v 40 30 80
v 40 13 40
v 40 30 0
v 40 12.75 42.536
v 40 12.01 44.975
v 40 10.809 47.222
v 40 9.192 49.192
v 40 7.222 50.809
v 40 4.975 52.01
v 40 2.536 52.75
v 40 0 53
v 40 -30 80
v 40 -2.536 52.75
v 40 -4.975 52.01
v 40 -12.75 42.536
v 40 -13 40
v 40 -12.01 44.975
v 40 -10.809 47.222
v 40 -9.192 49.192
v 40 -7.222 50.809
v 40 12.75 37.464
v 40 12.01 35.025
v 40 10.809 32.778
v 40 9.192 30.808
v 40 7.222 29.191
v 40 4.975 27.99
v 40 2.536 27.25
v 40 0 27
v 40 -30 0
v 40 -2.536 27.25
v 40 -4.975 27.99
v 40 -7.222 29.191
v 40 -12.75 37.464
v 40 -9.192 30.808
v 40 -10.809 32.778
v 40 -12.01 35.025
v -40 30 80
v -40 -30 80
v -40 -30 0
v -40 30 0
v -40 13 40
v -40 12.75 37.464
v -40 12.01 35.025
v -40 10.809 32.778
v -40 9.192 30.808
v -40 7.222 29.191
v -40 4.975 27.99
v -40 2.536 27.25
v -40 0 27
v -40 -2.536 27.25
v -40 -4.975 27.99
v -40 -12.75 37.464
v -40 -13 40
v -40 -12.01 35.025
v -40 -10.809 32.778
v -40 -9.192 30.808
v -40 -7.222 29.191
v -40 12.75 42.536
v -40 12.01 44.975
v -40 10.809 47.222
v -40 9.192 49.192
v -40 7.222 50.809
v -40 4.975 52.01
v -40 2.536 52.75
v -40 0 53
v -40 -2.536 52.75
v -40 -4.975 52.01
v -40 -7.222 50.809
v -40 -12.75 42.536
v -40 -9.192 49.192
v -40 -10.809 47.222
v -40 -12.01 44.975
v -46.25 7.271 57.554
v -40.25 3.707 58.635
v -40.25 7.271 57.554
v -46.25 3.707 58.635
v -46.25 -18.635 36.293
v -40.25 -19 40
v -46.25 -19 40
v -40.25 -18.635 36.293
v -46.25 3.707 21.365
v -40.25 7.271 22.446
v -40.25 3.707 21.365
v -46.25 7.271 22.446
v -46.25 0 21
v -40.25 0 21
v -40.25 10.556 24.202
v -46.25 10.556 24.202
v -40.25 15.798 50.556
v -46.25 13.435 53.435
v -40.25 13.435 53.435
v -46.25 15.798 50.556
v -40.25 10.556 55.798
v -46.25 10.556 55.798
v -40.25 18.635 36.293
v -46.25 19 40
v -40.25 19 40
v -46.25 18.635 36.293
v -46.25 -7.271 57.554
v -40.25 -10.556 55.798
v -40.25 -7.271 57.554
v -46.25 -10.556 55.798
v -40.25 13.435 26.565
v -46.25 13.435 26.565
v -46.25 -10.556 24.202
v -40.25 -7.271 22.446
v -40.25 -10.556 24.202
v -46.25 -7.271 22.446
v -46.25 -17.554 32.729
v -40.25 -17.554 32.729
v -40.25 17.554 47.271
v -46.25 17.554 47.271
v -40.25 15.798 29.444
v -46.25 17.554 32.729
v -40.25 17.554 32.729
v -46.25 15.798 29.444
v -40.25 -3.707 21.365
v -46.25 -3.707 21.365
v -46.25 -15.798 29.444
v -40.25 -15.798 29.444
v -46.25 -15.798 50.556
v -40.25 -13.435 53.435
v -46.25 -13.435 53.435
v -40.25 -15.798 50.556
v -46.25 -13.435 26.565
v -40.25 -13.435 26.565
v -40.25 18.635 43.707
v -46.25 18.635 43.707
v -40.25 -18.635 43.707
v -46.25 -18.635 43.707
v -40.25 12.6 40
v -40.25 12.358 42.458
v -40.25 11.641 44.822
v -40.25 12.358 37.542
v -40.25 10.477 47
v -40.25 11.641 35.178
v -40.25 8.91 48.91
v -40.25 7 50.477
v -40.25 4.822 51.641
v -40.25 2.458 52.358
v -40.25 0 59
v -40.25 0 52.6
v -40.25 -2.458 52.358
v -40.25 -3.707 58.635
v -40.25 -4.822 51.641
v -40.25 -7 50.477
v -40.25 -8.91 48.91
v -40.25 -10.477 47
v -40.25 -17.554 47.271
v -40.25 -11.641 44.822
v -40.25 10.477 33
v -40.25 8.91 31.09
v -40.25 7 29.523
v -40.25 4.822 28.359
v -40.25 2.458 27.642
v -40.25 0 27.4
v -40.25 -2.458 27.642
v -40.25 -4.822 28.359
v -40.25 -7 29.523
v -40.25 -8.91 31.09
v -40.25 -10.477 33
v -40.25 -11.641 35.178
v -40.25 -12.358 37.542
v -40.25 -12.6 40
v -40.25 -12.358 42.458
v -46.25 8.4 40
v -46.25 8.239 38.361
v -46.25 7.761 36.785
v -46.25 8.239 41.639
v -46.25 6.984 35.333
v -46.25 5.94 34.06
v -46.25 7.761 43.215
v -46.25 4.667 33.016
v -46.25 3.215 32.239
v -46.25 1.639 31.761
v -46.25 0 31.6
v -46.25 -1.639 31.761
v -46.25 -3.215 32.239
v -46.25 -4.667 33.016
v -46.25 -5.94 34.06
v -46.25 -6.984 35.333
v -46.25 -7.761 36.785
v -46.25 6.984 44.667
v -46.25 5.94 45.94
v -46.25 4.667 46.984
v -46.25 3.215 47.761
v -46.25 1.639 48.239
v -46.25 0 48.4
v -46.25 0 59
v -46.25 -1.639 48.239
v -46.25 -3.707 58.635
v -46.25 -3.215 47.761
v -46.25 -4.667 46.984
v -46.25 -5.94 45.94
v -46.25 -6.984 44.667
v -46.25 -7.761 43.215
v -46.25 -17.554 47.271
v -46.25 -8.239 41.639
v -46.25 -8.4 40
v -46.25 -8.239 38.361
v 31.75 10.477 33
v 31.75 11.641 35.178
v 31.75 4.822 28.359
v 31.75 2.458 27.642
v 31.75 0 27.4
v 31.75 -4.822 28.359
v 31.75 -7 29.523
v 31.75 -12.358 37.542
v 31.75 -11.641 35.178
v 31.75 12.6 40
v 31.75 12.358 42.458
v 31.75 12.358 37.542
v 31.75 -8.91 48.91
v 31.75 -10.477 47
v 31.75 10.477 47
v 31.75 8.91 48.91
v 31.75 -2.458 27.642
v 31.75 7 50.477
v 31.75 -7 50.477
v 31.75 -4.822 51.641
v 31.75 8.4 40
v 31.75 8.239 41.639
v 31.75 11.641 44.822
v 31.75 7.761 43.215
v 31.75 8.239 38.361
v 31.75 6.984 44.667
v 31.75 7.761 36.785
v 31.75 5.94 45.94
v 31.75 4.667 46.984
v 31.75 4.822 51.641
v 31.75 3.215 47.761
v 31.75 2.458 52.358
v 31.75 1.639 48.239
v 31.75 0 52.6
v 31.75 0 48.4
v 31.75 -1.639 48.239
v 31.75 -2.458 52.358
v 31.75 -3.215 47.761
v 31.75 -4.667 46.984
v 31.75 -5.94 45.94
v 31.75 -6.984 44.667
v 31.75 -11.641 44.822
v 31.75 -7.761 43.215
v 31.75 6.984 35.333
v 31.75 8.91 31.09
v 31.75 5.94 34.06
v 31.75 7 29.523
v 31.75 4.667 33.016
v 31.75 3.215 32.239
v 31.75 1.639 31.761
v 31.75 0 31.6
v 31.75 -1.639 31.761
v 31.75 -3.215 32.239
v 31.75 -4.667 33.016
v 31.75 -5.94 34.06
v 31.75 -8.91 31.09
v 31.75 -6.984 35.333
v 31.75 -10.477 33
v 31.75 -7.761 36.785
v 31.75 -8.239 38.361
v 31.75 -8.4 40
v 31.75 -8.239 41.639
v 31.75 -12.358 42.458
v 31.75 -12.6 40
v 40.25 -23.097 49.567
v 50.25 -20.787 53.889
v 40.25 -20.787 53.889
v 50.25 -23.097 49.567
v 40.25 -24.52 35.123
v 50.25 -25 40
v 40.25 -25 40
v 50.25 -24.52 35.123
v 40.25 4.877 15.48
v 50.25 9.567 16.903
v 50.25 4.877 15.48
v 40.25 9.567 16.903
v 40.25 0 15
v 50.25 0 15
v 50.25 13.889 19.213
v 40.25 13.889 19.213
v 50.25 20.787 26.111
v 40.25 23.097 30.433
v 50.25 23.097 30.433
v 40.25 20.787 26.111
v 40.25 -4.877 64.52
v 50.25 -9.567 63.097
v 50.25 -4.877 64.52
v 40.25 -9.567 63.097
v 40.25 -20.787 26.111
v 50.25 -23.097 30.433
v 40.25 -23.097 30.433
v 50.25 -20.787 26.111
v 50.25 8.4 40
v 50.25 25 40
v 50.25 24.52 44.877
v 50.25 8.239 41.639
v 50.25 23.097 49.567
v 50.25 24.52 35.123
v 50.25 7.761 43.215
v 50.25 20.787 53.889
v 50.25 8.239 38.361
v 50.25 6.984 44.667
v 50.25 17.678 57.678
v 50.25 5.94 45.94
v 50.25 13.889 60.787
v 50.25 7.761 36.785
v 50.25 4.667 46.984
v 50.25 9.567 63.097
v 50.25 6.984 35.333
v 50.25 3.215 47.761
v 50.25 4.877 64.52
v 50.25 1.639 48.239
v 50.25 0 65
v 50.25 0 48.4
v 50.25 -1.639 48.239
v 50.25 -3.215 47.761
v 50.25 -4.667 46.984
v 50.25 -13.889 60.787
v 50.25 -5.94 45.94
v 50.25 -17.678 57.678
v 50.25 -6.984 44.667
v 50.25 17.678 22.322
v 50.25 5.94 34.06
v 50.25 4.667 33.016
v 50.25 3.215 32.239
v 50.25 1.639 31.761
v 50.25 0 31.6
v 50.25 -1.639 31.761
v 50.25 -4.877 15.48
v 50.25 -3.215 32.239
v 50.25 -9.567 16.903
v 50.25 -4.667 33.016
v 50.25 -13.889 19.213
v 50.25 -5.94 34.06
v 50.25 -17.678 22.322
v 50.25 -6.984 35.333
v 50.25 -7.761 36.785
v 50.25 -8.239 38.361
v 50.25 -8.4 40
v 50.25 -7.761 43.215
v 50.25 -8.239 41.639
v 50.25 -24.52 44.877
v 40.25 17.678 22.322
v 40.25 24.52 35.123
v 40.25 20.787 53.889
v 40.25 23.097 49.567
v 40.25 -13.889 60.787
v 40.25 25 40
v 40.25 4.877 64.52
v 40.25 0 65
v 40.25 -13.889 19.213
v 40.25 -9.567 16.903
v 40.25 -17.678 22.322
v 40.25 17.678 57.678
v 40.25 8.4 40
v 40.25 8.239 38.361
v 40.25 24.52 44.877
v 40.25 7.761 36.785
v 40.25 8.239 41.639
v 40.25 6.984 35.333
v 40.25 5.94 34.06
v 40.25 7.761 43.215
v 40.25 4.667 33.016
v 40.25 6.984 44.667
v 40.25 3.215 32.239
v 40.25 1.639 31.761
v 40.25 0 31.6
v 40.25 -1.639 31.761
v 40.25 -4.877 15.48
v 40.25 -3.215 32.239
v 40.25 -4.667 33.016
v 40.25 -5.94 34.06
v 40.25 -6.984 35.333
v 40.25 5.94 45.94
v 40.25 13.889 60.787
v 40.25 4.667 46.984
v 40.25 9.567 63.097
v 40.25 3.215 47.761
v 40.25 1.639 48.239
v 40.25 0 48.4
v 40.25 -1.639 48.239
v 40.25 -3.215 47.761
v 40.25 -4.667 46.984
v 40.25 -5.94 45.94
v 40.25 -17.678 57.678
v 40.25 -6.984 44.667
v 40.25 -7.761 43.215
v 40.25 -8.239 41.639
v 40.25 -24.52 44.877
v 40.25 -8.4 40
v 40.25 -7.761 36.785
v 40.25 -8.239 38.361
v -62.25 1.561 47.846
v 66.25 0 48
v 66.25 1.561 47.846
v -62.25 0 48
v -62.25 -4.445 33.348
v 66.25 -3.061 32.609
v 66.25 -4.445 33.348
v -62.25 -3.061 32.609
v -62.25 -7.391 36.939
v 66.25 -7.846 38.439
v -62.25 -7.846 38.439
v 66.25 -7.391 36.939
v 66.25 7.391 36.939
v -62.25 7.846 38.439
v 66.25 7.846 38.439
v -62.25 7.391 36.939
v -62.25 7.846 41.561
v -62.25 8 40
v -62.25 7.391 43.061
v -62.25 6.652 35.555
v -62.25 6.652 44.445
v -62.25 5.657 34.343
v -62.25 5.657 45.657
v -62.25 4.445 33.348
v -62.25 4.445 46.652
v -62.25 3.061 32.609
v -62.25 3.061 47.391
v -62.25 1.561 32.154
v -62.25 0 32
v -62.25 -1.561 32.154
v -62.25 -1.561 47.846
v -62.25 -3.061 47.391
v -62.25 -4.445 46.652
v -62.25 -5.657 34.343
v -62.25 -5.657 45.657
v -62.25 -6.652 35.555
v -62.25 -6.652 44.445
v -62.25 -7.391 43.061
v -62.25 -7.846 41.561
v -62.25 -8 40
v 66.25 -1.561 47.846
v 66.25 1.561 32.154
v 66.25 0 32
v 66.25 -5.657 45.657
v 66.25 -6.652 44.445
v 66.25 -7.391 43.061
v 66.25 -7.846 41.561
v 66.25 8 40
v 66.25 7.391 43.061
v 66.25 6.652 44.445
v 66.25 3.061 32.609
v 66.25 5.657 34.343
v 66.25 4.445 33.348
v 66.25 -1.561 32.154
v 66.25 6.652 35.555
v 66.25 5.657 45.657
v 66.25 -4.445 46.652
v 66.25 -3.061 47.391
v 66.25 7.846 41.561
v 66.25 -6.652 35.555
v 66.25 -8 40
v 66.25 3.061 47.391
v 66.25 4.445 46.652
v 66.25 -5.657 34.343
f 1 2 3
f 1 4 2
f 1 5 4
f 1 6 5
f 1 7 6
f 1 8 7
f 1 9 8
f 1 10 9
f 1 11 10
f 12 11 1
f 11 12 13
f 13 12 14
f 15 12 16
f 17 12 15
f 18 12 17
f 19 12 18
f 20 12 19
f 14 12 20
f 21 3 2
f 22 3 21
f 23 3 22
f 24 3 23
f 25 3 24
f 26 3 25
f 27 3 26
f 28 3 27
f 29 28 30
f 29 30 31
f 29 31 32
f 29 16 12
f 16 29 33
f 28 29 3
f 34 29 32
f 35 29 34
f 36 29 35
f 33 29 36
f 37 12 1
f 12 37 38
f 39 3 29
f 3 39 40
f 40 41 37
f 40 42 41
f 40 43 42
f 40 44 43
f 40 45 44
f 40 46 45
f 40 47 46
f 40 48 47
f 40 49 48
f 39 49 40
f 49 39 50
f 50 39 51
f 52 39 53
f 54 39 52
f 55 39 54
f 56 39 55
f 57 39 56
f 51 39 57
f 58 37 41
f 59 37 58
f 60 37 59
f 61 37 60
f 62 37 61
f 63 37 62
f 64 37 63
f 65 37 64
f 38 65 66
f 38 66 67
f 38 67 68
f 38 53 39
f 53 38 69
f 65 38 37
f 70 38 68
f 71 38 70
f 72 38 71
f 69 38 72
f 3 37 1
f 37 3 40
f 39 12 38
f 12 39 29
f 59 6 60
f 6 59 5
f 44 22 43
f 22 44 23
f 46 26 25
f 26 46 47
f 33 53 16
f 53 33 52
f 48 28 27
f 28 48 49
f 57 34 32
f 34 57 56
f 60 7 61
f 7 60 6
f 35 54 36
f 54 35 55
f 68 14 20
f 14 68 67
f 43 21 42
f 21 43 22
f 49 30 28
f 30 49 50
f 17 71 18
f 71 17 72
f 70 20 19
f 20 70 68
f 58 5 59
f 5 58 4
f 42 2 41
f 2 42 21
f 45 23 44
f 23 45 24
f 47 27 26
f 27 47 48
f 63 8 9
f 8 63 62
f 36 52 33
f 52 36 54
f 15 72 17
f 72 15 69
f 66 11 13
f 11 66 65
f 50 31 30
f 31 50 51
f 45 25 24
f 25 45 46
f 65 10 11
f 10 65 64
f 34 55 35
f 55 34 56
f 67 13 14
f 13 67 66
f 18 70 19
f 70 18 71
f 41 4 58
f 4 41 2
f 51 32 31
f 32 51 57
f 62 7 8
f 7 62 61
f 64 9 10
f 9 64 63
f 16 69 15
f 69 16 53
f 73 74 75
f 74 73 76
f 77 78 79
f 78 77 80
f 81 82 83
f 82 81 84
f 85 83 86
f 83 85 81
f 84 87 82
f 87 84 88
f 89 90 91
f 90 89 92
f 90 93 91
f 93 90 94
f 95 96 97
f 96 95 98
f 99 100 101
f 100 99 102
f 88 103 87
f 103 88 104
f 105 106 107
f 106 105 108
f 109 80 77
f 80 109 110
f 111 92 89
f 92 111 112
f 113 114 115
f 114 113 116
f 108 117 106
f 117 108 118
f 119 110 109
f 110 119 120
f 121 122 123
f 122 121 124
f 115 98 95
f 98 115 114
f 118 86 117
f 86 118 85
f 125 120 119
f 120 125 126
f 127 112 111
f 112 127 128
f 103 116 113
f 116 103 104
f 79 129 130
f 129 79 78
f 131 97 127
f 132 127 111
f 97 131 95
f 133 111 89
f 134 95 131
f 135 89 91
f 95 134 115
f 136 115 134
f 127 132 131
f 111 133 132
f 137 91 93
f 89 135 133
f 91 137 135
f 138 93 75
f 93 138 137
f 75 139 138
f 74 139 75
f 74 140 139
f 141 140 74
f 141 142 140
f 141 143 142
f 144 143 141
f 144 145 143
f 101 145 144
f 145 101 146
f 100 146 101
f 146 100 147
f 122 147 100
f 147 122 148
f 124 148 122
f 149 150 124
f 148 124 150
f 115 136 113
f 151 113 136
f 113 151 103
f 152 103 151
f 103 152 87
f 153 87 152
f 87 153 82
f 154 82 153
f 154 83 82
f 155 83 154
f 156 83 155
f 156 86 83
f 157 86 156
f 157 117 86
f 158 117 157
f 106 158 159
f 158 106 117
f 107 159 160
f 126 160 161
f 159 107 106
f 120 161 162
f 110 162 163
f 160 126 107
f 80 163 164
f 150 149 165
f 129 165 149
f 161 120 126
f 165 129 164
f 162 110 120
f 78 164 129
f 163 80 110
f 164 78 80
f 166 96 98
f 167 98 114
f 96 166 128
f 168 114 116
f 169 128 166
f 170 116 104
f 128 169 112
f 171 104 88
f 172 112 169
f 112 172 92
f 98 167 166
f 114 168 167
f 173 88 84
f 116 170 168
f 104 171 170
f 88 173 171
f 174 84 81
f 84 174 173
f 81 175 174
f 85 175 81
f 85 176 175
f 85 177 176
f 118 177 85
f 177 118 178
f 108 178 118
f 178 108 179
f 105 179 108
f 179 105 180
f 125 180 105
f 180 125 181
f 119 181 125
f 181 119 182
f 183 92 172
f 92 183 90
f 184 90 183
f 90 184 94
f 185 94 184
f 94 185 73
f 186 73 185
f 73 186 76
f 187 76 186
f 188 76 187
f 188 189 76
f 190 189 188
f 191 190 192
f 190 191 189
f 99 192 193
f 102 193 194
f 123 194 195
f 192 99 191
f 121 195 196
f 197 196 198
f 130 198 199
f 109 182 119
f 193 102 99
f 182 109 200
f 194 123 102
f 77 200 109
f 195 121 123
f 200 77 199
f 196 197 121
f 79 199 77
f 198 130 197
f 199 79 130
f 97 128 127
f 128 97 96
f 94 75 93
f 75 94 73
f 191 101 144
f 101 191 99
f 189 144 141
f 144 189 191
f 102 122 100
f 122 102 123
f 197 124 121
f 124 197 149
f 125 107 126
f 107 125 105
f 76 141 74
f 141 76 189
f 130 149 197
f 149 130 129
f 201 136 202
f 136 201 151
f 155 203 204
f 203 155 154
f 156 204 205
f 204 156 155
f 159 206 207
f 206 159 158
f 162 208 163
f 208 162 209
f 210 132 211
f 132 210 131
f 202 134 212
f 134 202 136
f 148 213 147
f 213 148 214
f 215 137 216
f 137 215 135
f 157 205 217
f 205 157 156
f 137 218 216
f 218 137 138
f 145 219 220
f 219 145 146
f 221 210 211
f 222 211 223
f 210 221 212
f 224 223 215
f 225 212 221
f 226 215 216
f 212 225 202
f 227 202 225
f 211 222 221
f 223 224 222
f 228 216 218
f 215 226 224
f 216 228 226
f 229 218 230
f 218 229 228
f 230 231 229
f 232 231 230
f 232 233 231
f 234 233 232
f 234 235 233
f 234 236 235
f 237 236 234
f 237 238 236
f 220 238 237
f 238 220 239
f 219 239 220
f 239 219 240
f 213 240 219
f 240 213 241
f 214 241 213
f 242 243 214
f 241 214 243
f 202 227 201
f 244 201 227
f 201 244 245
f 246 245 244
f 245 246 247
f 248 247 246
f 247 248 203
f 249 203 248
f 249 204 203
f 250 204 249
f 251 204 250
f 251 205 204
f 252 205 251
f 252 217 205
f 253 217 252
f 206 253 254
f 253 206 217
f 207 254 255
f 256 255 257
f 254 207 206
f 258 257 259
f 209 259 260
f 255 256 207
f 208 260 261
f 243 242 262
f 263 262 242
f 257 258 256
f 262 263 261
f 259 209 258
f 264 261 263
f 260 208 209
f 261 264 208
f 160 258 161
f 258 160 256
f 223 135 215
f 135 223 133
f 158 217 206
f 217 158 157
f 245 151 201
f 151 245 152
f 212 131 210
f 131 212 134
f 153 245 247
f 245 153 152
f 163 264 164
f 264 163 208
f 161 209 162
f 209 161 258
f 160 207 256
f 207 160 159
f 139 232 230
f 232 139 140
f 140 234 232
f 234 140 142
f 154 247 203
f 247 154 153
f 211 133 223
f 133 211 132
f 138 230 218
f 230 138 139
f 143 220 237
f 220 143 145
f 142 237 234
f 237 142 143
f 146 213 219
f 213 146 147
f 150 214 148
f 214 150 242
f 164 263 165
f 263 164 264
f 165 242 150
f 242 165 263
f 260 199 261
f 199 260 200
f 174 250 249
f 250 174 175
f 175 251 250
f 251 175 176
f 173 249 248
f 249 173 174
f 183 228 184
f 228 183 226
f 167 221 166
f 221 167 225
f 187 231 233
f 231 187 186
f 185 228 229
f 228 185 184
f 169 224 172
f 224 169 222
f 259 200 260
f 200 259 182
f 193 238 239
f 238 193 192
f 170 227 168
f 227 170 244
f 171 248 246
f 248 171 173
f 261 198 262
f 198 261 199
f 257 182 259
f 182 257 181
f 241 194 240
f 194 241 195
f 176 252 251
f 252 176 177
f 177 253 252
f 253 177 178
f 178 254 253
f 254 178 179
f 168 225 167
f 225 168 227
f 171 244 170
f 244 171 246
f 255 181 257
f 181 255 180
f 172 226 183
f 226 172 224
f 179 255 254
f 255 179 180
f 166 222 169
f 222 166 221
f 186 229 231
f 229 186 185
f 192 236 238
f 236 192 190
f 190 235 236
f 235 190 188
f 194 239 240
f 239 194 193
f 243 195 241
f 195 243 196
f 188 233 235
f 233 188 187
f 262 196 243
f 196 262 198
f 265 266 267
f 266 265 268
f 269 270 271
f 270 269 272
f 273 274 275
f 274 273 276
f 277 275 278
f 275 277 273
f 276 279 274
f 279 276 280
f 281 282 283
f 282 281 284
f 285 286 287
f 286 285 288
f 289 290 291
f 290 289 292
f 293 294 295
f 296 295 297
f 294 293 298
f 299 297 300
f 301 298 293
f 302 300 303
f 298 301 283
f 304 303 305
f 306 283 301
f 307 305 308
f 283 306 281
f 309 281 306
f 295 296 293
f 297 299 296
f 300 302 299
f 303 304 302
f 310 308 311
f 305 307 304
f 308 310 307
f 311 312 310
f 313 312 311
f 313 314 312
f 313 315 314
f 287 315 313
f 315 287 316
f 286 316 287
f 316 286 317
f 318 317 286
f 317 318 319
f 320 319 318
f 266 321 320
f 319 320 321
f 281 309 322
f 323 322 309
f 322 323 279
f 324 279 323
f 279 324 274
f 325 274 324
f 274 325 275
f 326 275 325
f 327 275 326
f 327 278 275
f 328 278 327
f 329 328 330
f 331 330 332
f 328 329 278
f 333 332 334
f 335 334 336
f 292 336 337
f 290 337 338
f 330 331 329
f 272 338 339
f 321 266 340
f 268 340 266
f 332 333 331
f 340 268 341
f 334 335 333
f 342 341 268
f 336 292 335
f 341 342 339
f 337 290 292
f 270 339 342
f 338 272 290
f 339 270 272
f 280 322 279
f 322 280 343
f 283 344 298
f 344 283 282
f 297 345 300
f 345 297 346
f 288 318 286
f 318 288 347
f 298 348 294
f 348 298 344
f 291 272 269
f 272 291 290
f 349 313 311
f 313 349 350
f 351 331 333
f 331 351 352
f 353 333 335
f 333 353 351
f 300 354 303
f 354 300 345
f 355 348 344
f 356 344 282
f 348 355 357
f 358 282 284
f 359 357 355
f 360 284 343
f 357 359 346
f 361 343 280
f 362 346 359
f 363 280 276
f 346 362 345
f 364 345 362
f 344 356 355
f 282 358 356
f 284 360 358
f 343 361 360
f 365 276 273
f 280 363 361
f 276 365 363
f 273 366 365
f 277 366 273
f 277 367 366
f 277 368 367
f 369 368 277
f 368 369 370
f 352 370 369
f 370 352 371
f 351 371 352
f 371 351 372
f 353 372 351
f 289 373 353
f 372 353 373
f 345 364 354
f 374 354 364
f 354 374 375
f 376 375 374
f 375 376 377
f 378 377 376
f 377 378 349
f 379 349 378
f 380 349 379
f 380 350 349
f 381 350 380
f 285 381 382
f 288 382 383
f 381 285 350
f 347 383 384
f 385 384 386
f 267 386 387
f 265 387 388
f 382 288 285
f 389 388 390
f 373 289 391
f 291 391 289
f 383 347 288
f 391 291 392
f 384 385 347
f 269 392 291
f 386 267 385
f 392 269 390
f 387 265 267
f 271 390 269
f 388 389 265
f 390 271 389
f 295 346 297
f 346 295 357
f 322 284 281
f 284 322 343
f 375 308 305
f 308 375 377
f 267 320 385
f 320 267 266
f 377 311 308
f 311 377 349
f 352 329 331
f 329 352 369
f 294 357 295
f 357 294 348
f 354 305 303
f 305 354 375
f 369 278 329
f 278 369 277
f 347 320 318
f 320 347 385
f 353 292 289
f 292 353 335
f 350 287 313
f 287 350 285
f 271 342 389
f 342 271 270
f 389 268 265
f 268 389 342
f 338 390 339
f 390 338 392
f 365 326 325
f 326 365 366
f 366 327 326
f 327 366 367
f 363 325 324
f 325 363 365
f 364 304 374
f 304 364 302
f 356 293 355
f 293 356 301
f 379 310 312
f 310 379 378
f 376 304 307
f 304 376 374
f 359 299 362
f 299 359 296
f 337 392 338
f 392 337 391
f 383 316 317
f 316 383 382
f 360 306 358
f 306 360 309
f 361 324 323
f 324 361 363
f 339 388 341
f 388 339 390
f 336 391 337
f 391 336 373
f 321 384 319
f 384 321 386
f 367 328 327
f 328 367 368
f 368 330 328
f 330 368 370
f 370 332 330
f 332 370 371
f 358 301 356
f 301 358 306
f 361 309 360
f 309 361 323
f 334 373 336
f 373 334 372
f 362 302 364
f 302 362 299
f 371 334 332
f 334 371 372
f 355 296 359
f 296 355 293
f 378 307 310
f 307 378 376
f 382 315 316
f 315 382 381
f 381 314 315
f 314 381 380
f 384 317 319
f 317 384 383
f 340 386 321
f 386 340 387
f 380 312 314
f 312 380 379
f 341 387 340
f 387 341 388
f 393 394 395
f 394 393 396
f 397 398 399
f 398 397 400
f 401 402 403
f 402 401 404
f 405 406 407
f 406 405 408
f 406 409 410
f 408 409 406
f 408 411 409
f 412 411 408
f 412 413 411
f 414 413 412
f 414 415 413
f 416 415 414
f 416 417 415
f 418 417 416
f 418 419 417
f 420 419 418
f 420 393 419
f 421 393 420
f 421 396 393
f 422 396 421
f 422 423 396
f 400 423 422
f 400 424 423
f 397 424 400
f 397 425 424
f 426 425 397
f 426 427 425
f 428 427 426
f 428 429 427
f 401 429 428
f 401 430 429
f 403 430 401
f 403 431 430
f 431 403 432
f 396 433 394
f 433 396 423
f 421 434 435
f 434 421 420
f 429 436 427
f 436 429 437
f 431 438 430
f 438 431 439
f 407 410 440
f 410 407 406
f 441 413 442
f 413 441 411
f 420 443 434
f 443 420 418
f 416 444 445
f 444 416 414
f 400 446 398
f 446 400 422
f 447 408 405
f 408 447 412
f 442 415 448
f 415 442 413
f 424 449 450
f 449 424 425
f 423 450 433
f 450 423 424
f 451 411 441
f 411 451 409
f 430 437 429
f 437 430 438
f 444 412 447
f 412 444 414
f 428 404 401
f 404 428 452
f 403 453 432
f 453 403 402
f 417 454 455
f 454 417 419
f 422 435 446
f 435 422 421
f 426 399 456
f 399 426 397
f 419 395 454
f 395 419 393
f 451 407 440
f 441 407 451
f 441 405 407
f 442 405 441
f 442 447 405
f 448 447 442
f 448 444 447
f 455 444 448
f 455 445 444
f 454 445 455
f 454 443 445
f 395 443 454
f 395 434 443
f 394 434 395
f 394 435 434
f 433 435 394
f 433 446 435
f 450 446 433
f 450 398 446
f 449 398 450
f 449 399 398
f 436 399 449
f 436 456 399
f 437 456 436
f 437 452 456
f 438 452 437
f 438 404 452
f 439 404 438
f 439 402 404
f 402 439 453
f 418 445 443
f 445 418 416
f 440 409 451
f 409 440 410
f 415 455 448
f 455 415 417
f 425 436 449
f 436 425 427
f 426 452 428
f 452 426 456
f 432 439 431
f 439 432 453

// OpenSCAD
$fn = 32;

// ------------------------------------------------------------------------
// Bushed housing: 80 x 60 x 80 mm housing, bushing d25.2
// Every part is its own module, assembly() places them once.
// ------------------------------------------------------------------------

// --- part 1 ---
module housing() {
  difference() {
    translate([-40, -30, 0]) cube([80, 60, 80]);
    translate([0, 0, 40]) rotate([0, 90, 0]) cylinder(h = 82, d = 26, center = true);
  }
}

// --- part 2 ---
module bushing() {
  difference() {
    union() {
      cylinder(h = 6, d = 38);
      translate([0, 0, 6]) cylinder(h = 72, d = 25.2);
    }
    translate([0, 0, -1]) cylinder(h = 80, d = 16.8);
  }
}

// --- part 3 ---
module shaft() {
  translate([0, 0, -64.25]) cylinder(h = 128.5, d = 16);
}

// --- part 4 ---
module cover() {
  difference() {
    cylinder(h = 10, d = 50);
    translate([0, 0, -1]) cylinder(h = 12, d = 16.8);
  }
}

// --- assembly ---
module assembly() {
  translate([0, 0, 0]) rotate([0, 0, 0]) housing();
  translate([-46.25, 0, 40]) rotate([0, 90, 0]) bushing();
  translate([2, 0, 40]) rotate([0, 90, 0]) shaft();
  translate([40.25, 0, 40]) rotate([0, 90, 0]) cover();
}

assembly();
